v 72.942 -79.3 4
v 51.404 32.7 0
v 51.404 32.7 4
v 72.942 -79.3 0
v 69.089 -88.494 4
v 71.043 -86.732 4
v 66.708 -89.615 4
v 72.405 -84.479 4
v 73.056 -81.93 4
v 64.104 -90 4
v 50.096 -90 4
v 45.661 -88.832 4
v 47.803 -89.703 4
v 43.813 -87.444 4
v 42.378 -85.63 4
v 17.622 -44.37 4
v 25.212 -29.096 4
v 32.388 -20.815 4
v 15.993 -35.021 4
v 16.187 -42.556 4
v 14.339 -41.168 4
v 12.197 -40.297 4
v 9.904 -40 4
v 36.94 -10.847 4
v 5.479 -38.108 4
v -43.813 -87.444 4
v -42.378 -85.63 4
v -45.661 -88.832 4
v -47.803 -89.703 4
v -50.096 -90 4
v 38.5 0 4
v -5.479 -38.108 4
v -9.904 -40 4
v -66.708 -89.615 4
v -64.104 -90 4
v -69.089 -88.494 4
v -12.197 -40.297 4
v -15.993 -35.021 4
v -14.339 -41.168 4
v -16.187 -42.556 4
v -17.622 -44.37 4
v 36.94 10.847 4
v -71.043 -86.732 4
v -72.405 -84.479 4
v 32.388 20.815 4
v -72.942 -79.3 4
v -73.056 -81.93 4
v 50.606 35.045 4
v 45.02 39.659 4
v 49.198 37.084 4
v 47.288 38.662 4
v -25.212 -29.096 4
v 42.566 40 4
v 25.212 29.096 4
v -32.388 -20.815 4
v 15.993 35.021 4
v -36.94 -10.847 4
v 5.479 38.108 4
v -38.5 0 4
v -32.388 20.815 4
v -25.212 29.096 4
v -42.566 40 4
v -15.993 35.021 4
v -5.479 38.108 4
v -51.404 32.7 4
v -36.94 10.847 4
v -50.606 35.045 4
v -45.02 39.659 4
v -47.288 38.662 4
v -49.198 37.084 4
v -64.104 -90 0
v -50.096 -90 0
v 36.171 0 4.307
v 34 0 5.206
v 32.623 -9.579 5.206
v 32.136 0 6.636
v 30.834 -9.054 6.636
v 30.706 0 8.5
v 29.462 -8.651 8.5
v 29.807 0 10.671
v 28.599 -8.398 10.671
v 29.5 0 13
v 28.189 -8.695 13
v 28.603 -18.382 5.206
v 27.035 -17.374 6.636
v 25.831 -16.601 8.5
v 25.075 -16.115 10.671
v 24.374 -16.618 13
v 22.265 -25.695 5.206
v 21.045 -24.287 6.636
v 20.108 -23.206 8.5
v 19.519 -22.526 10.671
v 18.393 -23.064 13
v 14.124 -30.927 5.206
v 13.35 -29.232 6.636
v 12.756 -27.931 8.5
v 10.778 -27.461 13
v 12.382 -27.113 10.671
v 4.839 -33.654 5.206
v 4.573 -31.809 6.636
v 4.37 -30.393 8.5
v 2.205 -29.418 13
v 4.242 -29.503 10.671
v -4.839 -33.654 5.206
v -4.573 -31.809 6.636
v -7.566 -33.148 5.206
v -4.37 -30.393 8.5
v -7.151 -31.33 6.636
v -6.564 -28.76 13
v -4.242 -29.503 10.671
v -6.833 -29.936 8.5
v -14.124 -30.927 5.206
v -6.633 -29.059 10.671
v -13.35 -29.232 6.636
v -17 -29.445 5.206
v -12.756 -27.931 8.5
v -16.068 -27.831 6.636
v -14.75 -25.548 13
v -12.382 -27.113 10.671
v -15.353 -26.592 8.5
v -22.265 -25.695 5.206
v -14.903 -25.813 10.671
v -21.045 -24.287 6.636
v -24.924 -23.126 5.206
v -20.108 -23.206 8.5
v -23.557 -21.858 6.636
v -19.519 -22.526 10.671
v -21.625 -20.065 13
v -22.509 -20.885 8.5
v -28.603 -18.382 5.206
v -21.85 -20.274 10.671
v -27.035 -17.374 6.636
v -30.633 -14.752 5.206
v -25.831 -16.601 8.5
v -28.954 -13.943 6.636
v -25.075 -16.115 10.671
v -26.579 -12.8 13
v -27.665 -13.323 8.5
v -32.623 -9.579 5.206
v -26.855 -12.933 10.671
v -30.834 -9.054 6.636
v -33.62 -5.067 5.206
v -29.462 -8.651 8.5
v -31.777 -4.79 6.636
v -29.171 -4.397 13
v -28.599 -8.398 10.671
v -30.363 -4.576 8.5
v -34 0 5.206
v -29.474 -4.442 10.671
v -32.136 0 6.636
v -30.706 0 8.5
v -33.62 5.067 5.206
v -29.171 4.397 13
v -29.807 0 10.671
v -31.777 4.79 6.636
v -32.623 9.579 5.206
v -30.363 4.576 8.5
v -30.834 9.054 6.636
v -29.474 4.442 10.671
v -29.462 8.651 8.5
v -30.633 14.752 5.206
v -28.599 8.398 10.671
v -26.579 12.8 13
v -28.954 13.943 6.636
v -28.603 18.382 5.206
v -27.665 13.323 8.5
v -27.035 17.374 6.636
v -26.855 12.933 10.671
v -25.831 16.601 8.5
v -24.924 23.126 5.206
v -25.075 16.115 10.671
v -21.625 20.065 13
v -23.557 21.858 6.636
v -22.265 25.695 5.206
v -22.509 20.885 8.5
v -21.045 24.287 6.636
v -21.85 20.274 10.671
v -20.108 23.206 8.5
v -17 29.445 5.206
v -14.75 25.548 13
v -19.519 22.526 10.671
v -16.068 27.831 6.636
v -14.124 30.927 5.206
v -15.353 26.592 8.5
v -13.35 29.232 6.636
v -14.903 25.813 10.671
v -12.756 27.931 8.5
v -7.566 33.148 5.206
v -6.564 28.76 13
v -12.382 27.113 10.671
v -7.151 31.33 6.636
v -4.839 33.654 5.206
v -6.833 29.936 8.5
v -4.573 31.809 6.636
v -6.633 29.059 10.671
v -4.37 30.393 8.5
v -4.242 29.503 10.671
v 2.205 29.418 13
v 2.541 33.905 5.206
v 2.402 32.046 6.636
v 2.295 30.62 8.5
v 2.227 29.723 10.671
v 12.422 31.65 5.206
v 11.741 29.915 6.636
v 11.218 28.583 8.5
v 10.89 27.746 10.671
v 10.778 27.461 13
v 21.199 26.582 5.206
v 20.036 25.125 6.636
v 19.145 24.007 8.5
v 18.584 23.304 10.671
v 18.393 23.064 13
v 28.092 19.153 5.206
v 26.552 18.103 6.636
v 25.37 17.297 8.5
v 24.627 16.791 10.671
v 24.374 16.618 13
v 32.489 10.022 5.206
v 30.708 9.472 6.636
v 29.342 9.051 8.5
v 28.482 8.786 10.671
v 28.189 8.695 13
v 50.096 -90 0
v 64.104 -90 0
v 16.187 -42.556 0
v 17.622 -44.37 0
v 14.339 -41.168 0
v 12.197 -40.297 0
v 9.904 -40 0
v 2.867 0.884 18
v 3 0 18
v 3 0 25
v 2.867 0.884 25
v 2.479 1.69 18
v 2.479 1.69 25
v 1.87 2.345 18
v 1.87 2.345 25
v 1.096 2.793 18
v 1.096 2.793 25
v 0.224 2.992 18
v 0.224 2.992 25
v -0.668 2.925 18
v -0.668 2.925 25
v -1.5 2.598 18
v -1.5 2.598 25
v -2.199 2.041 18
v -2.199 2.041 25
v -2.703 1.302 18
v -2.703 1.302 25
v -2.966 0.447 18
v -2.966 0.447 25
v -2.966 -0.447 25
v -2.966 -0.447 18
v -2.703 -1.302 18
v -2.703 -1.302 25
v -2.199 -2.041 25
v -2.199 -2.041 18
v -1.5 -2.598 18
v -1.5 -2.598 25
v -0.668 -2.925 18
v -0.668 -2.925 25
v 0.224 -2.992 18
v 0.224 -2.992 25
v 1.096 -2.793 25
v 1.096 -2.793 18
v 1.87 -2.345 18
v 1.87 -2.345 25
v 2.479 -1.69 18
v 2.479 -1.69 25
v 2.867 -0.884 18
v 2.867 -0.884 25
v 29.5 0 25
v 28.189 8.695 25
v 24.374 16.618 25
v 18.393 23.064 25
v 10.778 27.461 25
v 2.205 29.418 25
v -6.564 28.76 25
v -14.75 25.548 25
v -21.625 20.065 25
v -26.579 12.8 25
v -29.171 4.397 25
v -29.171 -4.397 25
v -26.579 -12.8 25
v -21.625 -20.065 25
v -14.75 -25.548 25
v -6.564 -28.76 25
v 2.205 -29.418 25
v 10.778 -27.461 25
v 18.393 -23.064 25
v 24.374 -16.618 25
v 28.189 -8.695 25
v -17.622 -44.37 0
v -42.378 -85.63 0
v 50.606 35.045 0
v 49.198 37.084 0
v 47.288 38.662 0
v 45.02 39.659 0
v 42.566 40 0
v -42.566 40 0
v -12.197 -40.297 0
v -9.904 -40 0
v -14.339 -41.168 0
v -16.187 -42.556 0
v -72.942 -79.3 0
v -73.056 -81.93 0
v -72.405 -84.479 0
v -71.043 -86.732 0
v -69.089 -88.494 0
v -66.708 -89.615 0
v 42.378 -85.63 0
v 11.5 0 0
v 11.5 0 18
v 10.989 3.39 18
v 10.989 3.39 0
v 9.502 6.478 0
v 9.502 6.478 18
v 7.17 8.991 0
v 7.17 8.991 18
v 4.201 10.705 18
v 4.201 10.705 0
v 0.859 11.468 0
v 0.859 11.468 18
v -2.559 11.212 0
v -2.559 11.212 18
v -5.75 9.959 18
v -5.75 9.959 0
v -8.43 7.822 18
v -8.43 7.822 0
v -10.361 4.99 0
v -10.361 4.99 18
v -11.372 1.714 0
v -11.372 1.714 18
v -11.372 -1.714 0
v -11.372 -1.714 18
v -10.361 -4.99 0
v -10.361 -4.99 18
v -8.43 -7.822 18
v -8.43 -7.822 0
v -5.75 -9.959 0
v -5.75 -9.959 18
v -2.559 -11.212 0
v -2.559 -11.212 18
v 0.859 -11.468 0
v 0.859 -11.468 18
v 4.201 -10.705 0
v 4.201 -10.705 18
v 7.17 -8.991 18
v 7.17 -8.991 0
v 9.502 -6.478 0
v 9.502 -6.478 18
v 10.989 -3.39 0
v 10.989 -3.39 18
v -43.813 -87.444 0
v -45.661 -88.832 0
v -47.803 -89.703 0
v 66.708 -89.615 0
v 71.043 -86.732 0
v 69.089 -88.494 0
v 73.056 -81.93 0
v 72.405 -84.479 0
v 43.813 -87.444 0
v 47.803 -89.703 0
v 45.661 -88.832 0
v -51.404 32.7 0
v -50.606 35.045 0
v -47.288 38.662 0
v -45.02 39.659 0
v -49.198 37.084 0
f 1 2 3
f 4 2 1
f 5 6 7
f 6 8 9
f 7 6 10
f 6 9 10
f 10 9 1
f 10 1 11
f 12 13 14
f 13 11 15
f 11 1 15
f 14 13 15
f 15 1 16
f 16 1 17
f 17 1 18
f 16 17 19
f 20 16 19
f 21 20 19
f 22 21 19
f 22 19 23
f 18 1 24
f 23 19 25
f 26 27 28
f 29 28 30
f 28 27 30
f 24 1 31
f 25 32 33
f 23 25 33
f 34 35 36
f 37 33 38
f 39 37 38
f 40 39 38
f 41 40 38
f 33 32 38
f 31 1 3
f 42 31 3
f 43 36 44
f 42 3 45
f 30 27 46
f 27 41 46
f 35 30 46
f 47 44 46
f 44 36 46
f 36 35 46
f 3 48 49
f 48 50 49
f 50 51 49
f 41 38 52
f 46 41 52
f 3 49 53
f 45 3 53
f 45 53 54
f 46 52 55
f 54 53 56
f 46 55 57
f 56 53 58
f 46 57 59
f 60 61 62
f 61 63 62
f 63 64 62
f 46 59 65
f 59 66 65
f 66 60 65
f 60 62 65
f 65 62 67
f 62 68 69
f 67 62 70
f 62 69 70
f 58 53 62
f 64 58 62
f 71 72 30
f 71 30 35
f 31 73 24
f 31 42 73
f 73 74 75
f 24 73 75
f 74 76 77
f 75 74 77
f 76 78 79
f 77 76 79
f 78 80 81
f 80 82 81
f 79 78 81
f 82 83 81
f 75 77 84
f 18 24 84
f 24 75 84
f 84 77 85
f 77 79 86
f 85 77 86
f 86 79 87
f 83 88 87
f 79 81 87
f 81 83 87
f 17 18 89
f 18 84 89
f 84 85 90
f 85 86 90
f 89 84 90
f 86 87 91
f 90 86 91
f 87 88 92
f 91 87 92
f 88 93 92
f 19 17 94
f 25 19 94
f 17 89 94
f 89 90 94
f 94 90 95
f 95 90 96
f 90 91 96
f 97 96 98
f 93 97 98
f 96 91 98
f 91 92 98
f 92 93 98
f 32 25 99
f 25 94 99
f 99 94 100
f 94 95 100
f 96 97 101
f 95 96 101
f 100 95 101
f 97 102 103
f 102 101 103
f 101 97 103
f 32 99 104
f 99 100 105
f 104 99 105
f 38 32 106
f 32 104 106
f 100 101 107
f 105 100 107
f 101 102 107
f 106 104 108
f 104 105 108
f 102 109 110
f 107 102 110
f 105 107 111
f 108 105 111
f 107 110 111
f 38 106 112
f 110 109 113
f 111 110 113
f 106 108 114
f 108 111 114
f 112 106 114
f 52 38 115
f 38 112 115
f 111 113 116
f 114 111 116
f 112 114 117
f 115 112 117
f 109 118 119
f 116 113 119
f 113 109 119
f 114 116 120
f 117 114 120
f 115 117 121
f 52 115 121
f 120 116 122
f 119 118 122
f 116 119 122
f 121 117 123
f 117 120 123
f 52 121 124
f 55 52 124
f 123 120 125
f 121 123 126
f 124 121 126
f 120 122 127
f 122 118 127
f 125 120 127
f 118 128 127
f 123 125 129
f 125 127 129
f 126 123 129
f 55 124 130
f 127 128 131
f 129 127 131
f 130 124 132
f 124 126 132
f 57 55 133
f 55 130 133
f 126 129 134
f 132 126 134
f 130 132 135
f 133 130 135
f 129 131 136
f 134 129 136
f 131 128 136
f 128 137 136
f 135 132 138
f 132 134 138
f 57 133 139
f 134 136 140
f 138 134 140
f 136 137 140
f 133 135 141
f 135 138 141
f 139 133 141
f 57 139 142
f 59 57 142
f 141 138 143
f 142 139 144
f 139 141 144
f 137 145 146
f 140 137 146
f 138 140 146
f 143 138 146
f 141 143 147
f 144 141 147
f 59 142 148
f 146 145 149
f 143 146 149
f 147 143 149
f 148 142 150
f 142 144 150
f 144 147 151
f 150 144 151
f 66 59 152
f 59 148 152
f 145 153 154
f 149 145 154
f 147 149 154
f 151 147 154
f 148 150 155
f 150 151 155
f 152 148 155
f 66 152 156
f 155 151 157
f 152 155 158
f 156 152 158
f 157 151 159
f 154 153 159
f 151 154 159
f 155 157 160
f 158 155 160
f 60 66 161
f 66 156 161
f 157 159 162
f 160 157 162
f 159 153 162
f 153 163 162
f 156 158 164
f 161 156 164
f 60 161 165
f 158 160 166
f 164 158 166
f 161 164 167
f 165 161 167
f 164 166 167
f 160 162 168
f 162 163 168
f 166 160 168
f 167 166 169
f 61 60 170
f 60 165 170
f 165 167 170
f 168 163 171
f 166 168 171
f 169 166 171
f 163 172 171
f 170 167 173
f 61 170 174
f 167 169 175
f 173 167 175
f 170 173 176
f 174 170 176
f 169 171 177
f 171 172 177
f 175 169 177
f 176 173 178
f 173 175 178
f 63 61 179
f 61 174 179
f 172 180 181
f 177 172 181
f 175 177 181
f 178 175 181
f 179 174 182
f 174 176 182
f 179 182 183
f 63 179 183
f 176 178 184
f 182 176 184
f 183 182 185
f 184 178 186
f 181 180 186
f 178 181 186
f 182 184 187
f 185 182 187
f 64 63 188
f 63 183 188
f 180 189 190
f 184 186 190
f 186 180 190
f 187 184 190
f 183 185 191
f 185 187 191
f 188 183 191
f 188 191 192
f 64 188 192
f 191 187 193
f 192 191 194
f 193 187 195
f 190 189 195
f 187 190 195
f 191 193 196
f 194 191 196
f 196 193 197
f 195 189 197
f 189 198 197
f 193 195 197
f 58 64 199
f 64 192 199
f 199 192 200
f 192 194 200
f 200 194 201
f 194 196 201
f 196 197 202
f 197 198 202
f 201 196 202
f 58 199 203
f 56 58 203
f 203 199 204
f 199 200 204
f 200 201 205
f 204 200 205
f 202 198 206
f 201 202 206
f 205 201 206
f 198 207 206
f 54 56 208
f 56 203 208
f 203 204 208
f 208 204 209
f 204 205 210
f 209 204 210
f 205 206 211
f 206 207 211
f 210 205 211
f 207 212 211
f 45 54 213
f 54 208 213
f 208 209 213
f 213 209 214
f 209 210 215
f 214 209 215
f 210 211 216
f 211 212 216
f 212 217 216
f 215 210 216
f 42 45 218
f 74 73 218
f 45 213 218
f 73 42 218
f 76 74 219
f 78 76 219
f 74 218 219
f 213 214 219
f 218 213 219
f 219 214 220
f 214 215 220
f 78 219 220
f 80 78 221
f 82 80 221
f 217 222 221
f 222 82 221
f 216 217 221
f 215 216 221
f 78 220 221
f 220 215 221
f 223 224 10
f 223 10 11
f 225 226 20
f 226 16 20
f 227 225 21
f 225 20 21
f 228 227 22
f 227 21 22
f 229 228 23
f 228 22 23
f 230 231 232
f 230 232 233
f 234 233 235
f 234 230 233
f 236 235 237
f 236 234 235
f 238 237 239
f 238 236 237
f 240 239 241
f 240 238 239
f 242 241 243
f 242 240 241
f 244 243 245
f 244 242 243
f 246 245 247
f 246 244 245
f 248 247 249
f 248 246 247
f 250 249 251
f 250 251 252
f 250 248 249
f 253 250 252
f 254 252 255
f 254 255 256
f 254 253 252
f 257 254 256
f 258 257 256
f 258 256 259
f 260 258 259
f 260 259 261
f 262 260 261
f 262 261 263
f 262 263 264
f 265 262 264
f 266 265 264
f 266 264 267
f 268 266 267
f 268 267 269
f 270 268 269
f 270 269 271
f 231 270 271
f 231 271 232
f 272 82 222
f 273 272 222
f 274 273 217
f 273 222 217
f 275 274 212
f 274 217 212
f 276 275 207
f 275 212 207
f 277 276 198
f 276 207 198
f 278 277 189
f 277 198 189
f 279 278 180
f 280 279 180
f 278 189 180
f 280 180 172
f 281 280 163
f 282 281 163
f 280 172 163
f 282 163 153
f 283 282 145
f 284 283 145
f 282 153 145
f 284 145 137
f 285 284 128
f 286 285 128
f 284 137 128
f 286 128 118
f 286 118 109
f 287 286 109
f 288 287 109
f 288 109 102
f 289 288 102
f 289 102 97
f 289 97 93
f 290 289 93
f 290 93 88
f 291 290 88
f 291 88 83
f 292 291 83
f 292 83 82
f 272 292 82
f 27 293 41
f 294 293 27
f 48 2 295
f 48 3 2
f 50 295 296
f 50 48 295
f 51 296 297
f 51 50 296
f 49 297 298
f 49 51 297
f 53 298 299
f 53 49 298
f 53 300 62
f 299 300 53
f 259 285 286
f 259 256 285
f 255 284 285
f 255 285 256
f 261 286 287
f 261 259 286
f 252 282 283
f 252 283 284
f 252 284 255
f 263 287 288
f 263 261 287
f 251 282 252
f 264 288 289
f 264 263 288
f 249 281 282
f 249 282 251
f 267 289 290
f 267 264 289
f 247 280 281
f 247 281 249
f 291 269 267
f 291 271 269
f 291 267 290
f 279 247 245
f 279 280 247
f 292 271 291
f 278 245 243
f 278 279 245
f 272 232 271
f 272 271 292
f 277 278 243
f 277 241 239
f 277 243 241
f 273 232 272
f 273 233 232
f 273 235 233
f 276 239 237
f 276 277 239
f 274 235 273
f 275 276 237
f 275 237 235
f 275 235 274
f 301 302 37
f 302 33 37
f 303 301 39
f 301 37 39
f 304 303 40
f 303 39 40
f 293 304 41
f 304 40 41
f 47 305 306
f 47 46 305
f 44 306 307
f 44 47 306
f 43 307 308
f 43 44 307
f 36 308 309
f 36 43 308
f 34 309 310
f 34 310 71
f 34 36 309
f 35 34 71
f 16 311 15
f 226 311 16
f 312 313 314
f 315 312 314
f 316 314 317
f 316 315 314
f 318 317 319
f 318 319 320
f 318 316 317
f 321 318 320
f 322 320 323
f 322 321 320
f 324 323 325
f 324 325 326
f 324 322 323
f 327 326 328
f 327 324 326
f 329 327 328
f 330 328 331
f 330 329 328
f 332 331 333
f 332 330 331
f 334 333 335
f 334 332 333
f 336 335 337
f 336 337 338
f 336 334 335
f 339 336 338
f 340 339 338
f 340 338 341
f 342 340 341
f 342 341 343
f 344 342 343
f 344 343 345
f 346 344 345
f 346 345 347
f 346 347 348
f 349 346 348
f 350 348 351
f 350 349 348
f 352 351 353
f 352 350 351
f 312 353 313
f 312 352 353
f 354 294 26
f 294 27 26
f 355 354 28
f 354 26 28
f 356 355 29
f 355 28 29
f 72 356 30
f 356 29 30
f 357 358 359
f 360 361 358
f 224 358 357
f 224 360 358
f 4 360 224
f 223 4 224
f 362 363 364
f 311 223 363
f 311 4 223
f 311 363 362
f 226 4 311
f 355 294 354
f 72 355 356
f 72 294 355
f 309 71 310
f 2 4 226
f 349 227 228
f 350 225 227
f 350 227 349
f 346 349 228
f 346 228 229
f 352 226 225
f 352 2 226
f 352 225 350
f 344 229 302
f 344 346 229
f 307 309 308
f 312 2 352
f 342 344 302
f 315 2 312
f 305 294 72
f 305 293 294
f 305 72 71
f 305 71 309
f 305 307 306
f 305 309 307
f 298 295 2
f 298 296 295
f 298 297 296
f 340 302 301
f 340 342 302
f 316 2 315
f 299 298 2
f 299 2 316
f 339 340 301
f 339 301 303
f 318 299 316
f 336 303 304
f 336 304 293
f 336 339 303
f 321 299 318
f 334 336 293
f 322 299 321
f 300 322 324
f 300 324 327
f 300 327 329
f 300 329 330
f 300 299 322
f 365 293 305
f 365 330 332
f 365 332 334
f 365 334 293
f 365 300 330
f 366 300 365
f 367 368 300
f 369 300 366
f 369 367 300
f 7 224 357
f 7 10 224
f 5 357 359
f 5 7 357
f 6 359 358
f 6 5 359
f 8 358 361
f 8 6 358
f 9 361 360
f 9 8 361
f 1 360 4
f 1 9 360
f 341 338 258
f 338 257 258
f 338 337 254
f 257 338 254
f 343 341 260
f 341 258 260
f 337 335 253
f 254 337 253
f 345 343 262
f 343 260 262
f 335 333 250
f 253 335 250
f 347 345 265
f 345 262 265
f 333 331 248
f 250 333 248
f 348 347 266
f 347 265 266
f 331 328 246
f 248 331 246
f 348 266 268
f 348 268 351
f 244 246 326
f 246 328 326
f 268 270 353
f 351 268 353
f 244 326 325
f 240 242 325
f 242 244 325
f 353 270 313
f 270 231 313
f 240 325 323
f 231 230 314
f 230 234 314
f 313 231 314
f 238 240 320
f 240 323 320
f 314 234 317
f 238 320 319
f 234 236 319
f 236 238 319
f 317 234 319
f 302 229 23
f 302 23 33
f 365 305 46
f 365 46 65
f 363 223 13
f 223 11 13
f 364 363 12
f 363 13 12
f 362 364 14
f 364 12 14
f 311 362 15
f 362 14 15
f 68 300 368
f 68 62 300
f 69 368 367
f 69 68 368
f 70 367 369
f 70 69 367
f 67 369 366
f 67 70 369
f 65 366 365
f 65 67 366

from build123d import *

# Parameters (mm, degrees)
SKETCH_R      = 3
PAD_DEPTH     = 4
SKETCH001_R   = 29.5
SKETCH001_R_2 = 3
PAD001_DEPTH  = 25
SKETCH002_R   = 11.5
SKETCH002_R_2 = 3
POCKET_DEPTH  = 18
FILLET_R      = 9
FILLET001_R   = 9


with BuildPart() as part:
    # Sketch → Pad (new body)
    with BuildSketch(Plane.XY):
        Polygon((75, -90), (45, -90), (15, -40), (-15, -40), (-45, -90), (-75, -90), (-50, 40), (50, 40), align=None)
        Circle(SKETCH_R, mode=Mode.SUBTRACT)
    extrude(amount=PAD_DEPTH)

    # Sketch001 → Pad001 (join)
    with BuildSketch(Plane.XY):
        Circle(SKETCH001_R)
        Circle(SKETCH001_R_2, mode=Mode.SUBTRACT)
    extrude(amount=PAD001_DEPTH)

    # Sketch002 → Pocket (cut)
    with BuildSketch(Plane.XY):
        Circle(SKETCH002_R)
        Circle(SKETCH002_R_2, mode=Mode.SUBTRACT)
    extrude(amount=POCKET_DEPTH, mode=Mode.SUBTRACT)

    # Fillet
    fillet_edges = [part.edges().sort_by_distance(p)[0] for p in [
        (-29.5, 0, 4),
    ]]
    fillet(fillet_edges, radius=FILLET_R)

    # Fillet001
    fillet001_edges = [part.edges().sort_by_distance(p)[0] for p in [
        (-75, -90, 2),
        (-45, -90, 2),
        (-15, -40, 2),
        (15, -40, 2),
        (45, -90, 2),
        (75, -90, 2),
        (50, 40, 2),
        (-50, 40, 2),
    ]]
    fillet(fillet001_edges, radius=FILLET001_R)


solid = part.part
